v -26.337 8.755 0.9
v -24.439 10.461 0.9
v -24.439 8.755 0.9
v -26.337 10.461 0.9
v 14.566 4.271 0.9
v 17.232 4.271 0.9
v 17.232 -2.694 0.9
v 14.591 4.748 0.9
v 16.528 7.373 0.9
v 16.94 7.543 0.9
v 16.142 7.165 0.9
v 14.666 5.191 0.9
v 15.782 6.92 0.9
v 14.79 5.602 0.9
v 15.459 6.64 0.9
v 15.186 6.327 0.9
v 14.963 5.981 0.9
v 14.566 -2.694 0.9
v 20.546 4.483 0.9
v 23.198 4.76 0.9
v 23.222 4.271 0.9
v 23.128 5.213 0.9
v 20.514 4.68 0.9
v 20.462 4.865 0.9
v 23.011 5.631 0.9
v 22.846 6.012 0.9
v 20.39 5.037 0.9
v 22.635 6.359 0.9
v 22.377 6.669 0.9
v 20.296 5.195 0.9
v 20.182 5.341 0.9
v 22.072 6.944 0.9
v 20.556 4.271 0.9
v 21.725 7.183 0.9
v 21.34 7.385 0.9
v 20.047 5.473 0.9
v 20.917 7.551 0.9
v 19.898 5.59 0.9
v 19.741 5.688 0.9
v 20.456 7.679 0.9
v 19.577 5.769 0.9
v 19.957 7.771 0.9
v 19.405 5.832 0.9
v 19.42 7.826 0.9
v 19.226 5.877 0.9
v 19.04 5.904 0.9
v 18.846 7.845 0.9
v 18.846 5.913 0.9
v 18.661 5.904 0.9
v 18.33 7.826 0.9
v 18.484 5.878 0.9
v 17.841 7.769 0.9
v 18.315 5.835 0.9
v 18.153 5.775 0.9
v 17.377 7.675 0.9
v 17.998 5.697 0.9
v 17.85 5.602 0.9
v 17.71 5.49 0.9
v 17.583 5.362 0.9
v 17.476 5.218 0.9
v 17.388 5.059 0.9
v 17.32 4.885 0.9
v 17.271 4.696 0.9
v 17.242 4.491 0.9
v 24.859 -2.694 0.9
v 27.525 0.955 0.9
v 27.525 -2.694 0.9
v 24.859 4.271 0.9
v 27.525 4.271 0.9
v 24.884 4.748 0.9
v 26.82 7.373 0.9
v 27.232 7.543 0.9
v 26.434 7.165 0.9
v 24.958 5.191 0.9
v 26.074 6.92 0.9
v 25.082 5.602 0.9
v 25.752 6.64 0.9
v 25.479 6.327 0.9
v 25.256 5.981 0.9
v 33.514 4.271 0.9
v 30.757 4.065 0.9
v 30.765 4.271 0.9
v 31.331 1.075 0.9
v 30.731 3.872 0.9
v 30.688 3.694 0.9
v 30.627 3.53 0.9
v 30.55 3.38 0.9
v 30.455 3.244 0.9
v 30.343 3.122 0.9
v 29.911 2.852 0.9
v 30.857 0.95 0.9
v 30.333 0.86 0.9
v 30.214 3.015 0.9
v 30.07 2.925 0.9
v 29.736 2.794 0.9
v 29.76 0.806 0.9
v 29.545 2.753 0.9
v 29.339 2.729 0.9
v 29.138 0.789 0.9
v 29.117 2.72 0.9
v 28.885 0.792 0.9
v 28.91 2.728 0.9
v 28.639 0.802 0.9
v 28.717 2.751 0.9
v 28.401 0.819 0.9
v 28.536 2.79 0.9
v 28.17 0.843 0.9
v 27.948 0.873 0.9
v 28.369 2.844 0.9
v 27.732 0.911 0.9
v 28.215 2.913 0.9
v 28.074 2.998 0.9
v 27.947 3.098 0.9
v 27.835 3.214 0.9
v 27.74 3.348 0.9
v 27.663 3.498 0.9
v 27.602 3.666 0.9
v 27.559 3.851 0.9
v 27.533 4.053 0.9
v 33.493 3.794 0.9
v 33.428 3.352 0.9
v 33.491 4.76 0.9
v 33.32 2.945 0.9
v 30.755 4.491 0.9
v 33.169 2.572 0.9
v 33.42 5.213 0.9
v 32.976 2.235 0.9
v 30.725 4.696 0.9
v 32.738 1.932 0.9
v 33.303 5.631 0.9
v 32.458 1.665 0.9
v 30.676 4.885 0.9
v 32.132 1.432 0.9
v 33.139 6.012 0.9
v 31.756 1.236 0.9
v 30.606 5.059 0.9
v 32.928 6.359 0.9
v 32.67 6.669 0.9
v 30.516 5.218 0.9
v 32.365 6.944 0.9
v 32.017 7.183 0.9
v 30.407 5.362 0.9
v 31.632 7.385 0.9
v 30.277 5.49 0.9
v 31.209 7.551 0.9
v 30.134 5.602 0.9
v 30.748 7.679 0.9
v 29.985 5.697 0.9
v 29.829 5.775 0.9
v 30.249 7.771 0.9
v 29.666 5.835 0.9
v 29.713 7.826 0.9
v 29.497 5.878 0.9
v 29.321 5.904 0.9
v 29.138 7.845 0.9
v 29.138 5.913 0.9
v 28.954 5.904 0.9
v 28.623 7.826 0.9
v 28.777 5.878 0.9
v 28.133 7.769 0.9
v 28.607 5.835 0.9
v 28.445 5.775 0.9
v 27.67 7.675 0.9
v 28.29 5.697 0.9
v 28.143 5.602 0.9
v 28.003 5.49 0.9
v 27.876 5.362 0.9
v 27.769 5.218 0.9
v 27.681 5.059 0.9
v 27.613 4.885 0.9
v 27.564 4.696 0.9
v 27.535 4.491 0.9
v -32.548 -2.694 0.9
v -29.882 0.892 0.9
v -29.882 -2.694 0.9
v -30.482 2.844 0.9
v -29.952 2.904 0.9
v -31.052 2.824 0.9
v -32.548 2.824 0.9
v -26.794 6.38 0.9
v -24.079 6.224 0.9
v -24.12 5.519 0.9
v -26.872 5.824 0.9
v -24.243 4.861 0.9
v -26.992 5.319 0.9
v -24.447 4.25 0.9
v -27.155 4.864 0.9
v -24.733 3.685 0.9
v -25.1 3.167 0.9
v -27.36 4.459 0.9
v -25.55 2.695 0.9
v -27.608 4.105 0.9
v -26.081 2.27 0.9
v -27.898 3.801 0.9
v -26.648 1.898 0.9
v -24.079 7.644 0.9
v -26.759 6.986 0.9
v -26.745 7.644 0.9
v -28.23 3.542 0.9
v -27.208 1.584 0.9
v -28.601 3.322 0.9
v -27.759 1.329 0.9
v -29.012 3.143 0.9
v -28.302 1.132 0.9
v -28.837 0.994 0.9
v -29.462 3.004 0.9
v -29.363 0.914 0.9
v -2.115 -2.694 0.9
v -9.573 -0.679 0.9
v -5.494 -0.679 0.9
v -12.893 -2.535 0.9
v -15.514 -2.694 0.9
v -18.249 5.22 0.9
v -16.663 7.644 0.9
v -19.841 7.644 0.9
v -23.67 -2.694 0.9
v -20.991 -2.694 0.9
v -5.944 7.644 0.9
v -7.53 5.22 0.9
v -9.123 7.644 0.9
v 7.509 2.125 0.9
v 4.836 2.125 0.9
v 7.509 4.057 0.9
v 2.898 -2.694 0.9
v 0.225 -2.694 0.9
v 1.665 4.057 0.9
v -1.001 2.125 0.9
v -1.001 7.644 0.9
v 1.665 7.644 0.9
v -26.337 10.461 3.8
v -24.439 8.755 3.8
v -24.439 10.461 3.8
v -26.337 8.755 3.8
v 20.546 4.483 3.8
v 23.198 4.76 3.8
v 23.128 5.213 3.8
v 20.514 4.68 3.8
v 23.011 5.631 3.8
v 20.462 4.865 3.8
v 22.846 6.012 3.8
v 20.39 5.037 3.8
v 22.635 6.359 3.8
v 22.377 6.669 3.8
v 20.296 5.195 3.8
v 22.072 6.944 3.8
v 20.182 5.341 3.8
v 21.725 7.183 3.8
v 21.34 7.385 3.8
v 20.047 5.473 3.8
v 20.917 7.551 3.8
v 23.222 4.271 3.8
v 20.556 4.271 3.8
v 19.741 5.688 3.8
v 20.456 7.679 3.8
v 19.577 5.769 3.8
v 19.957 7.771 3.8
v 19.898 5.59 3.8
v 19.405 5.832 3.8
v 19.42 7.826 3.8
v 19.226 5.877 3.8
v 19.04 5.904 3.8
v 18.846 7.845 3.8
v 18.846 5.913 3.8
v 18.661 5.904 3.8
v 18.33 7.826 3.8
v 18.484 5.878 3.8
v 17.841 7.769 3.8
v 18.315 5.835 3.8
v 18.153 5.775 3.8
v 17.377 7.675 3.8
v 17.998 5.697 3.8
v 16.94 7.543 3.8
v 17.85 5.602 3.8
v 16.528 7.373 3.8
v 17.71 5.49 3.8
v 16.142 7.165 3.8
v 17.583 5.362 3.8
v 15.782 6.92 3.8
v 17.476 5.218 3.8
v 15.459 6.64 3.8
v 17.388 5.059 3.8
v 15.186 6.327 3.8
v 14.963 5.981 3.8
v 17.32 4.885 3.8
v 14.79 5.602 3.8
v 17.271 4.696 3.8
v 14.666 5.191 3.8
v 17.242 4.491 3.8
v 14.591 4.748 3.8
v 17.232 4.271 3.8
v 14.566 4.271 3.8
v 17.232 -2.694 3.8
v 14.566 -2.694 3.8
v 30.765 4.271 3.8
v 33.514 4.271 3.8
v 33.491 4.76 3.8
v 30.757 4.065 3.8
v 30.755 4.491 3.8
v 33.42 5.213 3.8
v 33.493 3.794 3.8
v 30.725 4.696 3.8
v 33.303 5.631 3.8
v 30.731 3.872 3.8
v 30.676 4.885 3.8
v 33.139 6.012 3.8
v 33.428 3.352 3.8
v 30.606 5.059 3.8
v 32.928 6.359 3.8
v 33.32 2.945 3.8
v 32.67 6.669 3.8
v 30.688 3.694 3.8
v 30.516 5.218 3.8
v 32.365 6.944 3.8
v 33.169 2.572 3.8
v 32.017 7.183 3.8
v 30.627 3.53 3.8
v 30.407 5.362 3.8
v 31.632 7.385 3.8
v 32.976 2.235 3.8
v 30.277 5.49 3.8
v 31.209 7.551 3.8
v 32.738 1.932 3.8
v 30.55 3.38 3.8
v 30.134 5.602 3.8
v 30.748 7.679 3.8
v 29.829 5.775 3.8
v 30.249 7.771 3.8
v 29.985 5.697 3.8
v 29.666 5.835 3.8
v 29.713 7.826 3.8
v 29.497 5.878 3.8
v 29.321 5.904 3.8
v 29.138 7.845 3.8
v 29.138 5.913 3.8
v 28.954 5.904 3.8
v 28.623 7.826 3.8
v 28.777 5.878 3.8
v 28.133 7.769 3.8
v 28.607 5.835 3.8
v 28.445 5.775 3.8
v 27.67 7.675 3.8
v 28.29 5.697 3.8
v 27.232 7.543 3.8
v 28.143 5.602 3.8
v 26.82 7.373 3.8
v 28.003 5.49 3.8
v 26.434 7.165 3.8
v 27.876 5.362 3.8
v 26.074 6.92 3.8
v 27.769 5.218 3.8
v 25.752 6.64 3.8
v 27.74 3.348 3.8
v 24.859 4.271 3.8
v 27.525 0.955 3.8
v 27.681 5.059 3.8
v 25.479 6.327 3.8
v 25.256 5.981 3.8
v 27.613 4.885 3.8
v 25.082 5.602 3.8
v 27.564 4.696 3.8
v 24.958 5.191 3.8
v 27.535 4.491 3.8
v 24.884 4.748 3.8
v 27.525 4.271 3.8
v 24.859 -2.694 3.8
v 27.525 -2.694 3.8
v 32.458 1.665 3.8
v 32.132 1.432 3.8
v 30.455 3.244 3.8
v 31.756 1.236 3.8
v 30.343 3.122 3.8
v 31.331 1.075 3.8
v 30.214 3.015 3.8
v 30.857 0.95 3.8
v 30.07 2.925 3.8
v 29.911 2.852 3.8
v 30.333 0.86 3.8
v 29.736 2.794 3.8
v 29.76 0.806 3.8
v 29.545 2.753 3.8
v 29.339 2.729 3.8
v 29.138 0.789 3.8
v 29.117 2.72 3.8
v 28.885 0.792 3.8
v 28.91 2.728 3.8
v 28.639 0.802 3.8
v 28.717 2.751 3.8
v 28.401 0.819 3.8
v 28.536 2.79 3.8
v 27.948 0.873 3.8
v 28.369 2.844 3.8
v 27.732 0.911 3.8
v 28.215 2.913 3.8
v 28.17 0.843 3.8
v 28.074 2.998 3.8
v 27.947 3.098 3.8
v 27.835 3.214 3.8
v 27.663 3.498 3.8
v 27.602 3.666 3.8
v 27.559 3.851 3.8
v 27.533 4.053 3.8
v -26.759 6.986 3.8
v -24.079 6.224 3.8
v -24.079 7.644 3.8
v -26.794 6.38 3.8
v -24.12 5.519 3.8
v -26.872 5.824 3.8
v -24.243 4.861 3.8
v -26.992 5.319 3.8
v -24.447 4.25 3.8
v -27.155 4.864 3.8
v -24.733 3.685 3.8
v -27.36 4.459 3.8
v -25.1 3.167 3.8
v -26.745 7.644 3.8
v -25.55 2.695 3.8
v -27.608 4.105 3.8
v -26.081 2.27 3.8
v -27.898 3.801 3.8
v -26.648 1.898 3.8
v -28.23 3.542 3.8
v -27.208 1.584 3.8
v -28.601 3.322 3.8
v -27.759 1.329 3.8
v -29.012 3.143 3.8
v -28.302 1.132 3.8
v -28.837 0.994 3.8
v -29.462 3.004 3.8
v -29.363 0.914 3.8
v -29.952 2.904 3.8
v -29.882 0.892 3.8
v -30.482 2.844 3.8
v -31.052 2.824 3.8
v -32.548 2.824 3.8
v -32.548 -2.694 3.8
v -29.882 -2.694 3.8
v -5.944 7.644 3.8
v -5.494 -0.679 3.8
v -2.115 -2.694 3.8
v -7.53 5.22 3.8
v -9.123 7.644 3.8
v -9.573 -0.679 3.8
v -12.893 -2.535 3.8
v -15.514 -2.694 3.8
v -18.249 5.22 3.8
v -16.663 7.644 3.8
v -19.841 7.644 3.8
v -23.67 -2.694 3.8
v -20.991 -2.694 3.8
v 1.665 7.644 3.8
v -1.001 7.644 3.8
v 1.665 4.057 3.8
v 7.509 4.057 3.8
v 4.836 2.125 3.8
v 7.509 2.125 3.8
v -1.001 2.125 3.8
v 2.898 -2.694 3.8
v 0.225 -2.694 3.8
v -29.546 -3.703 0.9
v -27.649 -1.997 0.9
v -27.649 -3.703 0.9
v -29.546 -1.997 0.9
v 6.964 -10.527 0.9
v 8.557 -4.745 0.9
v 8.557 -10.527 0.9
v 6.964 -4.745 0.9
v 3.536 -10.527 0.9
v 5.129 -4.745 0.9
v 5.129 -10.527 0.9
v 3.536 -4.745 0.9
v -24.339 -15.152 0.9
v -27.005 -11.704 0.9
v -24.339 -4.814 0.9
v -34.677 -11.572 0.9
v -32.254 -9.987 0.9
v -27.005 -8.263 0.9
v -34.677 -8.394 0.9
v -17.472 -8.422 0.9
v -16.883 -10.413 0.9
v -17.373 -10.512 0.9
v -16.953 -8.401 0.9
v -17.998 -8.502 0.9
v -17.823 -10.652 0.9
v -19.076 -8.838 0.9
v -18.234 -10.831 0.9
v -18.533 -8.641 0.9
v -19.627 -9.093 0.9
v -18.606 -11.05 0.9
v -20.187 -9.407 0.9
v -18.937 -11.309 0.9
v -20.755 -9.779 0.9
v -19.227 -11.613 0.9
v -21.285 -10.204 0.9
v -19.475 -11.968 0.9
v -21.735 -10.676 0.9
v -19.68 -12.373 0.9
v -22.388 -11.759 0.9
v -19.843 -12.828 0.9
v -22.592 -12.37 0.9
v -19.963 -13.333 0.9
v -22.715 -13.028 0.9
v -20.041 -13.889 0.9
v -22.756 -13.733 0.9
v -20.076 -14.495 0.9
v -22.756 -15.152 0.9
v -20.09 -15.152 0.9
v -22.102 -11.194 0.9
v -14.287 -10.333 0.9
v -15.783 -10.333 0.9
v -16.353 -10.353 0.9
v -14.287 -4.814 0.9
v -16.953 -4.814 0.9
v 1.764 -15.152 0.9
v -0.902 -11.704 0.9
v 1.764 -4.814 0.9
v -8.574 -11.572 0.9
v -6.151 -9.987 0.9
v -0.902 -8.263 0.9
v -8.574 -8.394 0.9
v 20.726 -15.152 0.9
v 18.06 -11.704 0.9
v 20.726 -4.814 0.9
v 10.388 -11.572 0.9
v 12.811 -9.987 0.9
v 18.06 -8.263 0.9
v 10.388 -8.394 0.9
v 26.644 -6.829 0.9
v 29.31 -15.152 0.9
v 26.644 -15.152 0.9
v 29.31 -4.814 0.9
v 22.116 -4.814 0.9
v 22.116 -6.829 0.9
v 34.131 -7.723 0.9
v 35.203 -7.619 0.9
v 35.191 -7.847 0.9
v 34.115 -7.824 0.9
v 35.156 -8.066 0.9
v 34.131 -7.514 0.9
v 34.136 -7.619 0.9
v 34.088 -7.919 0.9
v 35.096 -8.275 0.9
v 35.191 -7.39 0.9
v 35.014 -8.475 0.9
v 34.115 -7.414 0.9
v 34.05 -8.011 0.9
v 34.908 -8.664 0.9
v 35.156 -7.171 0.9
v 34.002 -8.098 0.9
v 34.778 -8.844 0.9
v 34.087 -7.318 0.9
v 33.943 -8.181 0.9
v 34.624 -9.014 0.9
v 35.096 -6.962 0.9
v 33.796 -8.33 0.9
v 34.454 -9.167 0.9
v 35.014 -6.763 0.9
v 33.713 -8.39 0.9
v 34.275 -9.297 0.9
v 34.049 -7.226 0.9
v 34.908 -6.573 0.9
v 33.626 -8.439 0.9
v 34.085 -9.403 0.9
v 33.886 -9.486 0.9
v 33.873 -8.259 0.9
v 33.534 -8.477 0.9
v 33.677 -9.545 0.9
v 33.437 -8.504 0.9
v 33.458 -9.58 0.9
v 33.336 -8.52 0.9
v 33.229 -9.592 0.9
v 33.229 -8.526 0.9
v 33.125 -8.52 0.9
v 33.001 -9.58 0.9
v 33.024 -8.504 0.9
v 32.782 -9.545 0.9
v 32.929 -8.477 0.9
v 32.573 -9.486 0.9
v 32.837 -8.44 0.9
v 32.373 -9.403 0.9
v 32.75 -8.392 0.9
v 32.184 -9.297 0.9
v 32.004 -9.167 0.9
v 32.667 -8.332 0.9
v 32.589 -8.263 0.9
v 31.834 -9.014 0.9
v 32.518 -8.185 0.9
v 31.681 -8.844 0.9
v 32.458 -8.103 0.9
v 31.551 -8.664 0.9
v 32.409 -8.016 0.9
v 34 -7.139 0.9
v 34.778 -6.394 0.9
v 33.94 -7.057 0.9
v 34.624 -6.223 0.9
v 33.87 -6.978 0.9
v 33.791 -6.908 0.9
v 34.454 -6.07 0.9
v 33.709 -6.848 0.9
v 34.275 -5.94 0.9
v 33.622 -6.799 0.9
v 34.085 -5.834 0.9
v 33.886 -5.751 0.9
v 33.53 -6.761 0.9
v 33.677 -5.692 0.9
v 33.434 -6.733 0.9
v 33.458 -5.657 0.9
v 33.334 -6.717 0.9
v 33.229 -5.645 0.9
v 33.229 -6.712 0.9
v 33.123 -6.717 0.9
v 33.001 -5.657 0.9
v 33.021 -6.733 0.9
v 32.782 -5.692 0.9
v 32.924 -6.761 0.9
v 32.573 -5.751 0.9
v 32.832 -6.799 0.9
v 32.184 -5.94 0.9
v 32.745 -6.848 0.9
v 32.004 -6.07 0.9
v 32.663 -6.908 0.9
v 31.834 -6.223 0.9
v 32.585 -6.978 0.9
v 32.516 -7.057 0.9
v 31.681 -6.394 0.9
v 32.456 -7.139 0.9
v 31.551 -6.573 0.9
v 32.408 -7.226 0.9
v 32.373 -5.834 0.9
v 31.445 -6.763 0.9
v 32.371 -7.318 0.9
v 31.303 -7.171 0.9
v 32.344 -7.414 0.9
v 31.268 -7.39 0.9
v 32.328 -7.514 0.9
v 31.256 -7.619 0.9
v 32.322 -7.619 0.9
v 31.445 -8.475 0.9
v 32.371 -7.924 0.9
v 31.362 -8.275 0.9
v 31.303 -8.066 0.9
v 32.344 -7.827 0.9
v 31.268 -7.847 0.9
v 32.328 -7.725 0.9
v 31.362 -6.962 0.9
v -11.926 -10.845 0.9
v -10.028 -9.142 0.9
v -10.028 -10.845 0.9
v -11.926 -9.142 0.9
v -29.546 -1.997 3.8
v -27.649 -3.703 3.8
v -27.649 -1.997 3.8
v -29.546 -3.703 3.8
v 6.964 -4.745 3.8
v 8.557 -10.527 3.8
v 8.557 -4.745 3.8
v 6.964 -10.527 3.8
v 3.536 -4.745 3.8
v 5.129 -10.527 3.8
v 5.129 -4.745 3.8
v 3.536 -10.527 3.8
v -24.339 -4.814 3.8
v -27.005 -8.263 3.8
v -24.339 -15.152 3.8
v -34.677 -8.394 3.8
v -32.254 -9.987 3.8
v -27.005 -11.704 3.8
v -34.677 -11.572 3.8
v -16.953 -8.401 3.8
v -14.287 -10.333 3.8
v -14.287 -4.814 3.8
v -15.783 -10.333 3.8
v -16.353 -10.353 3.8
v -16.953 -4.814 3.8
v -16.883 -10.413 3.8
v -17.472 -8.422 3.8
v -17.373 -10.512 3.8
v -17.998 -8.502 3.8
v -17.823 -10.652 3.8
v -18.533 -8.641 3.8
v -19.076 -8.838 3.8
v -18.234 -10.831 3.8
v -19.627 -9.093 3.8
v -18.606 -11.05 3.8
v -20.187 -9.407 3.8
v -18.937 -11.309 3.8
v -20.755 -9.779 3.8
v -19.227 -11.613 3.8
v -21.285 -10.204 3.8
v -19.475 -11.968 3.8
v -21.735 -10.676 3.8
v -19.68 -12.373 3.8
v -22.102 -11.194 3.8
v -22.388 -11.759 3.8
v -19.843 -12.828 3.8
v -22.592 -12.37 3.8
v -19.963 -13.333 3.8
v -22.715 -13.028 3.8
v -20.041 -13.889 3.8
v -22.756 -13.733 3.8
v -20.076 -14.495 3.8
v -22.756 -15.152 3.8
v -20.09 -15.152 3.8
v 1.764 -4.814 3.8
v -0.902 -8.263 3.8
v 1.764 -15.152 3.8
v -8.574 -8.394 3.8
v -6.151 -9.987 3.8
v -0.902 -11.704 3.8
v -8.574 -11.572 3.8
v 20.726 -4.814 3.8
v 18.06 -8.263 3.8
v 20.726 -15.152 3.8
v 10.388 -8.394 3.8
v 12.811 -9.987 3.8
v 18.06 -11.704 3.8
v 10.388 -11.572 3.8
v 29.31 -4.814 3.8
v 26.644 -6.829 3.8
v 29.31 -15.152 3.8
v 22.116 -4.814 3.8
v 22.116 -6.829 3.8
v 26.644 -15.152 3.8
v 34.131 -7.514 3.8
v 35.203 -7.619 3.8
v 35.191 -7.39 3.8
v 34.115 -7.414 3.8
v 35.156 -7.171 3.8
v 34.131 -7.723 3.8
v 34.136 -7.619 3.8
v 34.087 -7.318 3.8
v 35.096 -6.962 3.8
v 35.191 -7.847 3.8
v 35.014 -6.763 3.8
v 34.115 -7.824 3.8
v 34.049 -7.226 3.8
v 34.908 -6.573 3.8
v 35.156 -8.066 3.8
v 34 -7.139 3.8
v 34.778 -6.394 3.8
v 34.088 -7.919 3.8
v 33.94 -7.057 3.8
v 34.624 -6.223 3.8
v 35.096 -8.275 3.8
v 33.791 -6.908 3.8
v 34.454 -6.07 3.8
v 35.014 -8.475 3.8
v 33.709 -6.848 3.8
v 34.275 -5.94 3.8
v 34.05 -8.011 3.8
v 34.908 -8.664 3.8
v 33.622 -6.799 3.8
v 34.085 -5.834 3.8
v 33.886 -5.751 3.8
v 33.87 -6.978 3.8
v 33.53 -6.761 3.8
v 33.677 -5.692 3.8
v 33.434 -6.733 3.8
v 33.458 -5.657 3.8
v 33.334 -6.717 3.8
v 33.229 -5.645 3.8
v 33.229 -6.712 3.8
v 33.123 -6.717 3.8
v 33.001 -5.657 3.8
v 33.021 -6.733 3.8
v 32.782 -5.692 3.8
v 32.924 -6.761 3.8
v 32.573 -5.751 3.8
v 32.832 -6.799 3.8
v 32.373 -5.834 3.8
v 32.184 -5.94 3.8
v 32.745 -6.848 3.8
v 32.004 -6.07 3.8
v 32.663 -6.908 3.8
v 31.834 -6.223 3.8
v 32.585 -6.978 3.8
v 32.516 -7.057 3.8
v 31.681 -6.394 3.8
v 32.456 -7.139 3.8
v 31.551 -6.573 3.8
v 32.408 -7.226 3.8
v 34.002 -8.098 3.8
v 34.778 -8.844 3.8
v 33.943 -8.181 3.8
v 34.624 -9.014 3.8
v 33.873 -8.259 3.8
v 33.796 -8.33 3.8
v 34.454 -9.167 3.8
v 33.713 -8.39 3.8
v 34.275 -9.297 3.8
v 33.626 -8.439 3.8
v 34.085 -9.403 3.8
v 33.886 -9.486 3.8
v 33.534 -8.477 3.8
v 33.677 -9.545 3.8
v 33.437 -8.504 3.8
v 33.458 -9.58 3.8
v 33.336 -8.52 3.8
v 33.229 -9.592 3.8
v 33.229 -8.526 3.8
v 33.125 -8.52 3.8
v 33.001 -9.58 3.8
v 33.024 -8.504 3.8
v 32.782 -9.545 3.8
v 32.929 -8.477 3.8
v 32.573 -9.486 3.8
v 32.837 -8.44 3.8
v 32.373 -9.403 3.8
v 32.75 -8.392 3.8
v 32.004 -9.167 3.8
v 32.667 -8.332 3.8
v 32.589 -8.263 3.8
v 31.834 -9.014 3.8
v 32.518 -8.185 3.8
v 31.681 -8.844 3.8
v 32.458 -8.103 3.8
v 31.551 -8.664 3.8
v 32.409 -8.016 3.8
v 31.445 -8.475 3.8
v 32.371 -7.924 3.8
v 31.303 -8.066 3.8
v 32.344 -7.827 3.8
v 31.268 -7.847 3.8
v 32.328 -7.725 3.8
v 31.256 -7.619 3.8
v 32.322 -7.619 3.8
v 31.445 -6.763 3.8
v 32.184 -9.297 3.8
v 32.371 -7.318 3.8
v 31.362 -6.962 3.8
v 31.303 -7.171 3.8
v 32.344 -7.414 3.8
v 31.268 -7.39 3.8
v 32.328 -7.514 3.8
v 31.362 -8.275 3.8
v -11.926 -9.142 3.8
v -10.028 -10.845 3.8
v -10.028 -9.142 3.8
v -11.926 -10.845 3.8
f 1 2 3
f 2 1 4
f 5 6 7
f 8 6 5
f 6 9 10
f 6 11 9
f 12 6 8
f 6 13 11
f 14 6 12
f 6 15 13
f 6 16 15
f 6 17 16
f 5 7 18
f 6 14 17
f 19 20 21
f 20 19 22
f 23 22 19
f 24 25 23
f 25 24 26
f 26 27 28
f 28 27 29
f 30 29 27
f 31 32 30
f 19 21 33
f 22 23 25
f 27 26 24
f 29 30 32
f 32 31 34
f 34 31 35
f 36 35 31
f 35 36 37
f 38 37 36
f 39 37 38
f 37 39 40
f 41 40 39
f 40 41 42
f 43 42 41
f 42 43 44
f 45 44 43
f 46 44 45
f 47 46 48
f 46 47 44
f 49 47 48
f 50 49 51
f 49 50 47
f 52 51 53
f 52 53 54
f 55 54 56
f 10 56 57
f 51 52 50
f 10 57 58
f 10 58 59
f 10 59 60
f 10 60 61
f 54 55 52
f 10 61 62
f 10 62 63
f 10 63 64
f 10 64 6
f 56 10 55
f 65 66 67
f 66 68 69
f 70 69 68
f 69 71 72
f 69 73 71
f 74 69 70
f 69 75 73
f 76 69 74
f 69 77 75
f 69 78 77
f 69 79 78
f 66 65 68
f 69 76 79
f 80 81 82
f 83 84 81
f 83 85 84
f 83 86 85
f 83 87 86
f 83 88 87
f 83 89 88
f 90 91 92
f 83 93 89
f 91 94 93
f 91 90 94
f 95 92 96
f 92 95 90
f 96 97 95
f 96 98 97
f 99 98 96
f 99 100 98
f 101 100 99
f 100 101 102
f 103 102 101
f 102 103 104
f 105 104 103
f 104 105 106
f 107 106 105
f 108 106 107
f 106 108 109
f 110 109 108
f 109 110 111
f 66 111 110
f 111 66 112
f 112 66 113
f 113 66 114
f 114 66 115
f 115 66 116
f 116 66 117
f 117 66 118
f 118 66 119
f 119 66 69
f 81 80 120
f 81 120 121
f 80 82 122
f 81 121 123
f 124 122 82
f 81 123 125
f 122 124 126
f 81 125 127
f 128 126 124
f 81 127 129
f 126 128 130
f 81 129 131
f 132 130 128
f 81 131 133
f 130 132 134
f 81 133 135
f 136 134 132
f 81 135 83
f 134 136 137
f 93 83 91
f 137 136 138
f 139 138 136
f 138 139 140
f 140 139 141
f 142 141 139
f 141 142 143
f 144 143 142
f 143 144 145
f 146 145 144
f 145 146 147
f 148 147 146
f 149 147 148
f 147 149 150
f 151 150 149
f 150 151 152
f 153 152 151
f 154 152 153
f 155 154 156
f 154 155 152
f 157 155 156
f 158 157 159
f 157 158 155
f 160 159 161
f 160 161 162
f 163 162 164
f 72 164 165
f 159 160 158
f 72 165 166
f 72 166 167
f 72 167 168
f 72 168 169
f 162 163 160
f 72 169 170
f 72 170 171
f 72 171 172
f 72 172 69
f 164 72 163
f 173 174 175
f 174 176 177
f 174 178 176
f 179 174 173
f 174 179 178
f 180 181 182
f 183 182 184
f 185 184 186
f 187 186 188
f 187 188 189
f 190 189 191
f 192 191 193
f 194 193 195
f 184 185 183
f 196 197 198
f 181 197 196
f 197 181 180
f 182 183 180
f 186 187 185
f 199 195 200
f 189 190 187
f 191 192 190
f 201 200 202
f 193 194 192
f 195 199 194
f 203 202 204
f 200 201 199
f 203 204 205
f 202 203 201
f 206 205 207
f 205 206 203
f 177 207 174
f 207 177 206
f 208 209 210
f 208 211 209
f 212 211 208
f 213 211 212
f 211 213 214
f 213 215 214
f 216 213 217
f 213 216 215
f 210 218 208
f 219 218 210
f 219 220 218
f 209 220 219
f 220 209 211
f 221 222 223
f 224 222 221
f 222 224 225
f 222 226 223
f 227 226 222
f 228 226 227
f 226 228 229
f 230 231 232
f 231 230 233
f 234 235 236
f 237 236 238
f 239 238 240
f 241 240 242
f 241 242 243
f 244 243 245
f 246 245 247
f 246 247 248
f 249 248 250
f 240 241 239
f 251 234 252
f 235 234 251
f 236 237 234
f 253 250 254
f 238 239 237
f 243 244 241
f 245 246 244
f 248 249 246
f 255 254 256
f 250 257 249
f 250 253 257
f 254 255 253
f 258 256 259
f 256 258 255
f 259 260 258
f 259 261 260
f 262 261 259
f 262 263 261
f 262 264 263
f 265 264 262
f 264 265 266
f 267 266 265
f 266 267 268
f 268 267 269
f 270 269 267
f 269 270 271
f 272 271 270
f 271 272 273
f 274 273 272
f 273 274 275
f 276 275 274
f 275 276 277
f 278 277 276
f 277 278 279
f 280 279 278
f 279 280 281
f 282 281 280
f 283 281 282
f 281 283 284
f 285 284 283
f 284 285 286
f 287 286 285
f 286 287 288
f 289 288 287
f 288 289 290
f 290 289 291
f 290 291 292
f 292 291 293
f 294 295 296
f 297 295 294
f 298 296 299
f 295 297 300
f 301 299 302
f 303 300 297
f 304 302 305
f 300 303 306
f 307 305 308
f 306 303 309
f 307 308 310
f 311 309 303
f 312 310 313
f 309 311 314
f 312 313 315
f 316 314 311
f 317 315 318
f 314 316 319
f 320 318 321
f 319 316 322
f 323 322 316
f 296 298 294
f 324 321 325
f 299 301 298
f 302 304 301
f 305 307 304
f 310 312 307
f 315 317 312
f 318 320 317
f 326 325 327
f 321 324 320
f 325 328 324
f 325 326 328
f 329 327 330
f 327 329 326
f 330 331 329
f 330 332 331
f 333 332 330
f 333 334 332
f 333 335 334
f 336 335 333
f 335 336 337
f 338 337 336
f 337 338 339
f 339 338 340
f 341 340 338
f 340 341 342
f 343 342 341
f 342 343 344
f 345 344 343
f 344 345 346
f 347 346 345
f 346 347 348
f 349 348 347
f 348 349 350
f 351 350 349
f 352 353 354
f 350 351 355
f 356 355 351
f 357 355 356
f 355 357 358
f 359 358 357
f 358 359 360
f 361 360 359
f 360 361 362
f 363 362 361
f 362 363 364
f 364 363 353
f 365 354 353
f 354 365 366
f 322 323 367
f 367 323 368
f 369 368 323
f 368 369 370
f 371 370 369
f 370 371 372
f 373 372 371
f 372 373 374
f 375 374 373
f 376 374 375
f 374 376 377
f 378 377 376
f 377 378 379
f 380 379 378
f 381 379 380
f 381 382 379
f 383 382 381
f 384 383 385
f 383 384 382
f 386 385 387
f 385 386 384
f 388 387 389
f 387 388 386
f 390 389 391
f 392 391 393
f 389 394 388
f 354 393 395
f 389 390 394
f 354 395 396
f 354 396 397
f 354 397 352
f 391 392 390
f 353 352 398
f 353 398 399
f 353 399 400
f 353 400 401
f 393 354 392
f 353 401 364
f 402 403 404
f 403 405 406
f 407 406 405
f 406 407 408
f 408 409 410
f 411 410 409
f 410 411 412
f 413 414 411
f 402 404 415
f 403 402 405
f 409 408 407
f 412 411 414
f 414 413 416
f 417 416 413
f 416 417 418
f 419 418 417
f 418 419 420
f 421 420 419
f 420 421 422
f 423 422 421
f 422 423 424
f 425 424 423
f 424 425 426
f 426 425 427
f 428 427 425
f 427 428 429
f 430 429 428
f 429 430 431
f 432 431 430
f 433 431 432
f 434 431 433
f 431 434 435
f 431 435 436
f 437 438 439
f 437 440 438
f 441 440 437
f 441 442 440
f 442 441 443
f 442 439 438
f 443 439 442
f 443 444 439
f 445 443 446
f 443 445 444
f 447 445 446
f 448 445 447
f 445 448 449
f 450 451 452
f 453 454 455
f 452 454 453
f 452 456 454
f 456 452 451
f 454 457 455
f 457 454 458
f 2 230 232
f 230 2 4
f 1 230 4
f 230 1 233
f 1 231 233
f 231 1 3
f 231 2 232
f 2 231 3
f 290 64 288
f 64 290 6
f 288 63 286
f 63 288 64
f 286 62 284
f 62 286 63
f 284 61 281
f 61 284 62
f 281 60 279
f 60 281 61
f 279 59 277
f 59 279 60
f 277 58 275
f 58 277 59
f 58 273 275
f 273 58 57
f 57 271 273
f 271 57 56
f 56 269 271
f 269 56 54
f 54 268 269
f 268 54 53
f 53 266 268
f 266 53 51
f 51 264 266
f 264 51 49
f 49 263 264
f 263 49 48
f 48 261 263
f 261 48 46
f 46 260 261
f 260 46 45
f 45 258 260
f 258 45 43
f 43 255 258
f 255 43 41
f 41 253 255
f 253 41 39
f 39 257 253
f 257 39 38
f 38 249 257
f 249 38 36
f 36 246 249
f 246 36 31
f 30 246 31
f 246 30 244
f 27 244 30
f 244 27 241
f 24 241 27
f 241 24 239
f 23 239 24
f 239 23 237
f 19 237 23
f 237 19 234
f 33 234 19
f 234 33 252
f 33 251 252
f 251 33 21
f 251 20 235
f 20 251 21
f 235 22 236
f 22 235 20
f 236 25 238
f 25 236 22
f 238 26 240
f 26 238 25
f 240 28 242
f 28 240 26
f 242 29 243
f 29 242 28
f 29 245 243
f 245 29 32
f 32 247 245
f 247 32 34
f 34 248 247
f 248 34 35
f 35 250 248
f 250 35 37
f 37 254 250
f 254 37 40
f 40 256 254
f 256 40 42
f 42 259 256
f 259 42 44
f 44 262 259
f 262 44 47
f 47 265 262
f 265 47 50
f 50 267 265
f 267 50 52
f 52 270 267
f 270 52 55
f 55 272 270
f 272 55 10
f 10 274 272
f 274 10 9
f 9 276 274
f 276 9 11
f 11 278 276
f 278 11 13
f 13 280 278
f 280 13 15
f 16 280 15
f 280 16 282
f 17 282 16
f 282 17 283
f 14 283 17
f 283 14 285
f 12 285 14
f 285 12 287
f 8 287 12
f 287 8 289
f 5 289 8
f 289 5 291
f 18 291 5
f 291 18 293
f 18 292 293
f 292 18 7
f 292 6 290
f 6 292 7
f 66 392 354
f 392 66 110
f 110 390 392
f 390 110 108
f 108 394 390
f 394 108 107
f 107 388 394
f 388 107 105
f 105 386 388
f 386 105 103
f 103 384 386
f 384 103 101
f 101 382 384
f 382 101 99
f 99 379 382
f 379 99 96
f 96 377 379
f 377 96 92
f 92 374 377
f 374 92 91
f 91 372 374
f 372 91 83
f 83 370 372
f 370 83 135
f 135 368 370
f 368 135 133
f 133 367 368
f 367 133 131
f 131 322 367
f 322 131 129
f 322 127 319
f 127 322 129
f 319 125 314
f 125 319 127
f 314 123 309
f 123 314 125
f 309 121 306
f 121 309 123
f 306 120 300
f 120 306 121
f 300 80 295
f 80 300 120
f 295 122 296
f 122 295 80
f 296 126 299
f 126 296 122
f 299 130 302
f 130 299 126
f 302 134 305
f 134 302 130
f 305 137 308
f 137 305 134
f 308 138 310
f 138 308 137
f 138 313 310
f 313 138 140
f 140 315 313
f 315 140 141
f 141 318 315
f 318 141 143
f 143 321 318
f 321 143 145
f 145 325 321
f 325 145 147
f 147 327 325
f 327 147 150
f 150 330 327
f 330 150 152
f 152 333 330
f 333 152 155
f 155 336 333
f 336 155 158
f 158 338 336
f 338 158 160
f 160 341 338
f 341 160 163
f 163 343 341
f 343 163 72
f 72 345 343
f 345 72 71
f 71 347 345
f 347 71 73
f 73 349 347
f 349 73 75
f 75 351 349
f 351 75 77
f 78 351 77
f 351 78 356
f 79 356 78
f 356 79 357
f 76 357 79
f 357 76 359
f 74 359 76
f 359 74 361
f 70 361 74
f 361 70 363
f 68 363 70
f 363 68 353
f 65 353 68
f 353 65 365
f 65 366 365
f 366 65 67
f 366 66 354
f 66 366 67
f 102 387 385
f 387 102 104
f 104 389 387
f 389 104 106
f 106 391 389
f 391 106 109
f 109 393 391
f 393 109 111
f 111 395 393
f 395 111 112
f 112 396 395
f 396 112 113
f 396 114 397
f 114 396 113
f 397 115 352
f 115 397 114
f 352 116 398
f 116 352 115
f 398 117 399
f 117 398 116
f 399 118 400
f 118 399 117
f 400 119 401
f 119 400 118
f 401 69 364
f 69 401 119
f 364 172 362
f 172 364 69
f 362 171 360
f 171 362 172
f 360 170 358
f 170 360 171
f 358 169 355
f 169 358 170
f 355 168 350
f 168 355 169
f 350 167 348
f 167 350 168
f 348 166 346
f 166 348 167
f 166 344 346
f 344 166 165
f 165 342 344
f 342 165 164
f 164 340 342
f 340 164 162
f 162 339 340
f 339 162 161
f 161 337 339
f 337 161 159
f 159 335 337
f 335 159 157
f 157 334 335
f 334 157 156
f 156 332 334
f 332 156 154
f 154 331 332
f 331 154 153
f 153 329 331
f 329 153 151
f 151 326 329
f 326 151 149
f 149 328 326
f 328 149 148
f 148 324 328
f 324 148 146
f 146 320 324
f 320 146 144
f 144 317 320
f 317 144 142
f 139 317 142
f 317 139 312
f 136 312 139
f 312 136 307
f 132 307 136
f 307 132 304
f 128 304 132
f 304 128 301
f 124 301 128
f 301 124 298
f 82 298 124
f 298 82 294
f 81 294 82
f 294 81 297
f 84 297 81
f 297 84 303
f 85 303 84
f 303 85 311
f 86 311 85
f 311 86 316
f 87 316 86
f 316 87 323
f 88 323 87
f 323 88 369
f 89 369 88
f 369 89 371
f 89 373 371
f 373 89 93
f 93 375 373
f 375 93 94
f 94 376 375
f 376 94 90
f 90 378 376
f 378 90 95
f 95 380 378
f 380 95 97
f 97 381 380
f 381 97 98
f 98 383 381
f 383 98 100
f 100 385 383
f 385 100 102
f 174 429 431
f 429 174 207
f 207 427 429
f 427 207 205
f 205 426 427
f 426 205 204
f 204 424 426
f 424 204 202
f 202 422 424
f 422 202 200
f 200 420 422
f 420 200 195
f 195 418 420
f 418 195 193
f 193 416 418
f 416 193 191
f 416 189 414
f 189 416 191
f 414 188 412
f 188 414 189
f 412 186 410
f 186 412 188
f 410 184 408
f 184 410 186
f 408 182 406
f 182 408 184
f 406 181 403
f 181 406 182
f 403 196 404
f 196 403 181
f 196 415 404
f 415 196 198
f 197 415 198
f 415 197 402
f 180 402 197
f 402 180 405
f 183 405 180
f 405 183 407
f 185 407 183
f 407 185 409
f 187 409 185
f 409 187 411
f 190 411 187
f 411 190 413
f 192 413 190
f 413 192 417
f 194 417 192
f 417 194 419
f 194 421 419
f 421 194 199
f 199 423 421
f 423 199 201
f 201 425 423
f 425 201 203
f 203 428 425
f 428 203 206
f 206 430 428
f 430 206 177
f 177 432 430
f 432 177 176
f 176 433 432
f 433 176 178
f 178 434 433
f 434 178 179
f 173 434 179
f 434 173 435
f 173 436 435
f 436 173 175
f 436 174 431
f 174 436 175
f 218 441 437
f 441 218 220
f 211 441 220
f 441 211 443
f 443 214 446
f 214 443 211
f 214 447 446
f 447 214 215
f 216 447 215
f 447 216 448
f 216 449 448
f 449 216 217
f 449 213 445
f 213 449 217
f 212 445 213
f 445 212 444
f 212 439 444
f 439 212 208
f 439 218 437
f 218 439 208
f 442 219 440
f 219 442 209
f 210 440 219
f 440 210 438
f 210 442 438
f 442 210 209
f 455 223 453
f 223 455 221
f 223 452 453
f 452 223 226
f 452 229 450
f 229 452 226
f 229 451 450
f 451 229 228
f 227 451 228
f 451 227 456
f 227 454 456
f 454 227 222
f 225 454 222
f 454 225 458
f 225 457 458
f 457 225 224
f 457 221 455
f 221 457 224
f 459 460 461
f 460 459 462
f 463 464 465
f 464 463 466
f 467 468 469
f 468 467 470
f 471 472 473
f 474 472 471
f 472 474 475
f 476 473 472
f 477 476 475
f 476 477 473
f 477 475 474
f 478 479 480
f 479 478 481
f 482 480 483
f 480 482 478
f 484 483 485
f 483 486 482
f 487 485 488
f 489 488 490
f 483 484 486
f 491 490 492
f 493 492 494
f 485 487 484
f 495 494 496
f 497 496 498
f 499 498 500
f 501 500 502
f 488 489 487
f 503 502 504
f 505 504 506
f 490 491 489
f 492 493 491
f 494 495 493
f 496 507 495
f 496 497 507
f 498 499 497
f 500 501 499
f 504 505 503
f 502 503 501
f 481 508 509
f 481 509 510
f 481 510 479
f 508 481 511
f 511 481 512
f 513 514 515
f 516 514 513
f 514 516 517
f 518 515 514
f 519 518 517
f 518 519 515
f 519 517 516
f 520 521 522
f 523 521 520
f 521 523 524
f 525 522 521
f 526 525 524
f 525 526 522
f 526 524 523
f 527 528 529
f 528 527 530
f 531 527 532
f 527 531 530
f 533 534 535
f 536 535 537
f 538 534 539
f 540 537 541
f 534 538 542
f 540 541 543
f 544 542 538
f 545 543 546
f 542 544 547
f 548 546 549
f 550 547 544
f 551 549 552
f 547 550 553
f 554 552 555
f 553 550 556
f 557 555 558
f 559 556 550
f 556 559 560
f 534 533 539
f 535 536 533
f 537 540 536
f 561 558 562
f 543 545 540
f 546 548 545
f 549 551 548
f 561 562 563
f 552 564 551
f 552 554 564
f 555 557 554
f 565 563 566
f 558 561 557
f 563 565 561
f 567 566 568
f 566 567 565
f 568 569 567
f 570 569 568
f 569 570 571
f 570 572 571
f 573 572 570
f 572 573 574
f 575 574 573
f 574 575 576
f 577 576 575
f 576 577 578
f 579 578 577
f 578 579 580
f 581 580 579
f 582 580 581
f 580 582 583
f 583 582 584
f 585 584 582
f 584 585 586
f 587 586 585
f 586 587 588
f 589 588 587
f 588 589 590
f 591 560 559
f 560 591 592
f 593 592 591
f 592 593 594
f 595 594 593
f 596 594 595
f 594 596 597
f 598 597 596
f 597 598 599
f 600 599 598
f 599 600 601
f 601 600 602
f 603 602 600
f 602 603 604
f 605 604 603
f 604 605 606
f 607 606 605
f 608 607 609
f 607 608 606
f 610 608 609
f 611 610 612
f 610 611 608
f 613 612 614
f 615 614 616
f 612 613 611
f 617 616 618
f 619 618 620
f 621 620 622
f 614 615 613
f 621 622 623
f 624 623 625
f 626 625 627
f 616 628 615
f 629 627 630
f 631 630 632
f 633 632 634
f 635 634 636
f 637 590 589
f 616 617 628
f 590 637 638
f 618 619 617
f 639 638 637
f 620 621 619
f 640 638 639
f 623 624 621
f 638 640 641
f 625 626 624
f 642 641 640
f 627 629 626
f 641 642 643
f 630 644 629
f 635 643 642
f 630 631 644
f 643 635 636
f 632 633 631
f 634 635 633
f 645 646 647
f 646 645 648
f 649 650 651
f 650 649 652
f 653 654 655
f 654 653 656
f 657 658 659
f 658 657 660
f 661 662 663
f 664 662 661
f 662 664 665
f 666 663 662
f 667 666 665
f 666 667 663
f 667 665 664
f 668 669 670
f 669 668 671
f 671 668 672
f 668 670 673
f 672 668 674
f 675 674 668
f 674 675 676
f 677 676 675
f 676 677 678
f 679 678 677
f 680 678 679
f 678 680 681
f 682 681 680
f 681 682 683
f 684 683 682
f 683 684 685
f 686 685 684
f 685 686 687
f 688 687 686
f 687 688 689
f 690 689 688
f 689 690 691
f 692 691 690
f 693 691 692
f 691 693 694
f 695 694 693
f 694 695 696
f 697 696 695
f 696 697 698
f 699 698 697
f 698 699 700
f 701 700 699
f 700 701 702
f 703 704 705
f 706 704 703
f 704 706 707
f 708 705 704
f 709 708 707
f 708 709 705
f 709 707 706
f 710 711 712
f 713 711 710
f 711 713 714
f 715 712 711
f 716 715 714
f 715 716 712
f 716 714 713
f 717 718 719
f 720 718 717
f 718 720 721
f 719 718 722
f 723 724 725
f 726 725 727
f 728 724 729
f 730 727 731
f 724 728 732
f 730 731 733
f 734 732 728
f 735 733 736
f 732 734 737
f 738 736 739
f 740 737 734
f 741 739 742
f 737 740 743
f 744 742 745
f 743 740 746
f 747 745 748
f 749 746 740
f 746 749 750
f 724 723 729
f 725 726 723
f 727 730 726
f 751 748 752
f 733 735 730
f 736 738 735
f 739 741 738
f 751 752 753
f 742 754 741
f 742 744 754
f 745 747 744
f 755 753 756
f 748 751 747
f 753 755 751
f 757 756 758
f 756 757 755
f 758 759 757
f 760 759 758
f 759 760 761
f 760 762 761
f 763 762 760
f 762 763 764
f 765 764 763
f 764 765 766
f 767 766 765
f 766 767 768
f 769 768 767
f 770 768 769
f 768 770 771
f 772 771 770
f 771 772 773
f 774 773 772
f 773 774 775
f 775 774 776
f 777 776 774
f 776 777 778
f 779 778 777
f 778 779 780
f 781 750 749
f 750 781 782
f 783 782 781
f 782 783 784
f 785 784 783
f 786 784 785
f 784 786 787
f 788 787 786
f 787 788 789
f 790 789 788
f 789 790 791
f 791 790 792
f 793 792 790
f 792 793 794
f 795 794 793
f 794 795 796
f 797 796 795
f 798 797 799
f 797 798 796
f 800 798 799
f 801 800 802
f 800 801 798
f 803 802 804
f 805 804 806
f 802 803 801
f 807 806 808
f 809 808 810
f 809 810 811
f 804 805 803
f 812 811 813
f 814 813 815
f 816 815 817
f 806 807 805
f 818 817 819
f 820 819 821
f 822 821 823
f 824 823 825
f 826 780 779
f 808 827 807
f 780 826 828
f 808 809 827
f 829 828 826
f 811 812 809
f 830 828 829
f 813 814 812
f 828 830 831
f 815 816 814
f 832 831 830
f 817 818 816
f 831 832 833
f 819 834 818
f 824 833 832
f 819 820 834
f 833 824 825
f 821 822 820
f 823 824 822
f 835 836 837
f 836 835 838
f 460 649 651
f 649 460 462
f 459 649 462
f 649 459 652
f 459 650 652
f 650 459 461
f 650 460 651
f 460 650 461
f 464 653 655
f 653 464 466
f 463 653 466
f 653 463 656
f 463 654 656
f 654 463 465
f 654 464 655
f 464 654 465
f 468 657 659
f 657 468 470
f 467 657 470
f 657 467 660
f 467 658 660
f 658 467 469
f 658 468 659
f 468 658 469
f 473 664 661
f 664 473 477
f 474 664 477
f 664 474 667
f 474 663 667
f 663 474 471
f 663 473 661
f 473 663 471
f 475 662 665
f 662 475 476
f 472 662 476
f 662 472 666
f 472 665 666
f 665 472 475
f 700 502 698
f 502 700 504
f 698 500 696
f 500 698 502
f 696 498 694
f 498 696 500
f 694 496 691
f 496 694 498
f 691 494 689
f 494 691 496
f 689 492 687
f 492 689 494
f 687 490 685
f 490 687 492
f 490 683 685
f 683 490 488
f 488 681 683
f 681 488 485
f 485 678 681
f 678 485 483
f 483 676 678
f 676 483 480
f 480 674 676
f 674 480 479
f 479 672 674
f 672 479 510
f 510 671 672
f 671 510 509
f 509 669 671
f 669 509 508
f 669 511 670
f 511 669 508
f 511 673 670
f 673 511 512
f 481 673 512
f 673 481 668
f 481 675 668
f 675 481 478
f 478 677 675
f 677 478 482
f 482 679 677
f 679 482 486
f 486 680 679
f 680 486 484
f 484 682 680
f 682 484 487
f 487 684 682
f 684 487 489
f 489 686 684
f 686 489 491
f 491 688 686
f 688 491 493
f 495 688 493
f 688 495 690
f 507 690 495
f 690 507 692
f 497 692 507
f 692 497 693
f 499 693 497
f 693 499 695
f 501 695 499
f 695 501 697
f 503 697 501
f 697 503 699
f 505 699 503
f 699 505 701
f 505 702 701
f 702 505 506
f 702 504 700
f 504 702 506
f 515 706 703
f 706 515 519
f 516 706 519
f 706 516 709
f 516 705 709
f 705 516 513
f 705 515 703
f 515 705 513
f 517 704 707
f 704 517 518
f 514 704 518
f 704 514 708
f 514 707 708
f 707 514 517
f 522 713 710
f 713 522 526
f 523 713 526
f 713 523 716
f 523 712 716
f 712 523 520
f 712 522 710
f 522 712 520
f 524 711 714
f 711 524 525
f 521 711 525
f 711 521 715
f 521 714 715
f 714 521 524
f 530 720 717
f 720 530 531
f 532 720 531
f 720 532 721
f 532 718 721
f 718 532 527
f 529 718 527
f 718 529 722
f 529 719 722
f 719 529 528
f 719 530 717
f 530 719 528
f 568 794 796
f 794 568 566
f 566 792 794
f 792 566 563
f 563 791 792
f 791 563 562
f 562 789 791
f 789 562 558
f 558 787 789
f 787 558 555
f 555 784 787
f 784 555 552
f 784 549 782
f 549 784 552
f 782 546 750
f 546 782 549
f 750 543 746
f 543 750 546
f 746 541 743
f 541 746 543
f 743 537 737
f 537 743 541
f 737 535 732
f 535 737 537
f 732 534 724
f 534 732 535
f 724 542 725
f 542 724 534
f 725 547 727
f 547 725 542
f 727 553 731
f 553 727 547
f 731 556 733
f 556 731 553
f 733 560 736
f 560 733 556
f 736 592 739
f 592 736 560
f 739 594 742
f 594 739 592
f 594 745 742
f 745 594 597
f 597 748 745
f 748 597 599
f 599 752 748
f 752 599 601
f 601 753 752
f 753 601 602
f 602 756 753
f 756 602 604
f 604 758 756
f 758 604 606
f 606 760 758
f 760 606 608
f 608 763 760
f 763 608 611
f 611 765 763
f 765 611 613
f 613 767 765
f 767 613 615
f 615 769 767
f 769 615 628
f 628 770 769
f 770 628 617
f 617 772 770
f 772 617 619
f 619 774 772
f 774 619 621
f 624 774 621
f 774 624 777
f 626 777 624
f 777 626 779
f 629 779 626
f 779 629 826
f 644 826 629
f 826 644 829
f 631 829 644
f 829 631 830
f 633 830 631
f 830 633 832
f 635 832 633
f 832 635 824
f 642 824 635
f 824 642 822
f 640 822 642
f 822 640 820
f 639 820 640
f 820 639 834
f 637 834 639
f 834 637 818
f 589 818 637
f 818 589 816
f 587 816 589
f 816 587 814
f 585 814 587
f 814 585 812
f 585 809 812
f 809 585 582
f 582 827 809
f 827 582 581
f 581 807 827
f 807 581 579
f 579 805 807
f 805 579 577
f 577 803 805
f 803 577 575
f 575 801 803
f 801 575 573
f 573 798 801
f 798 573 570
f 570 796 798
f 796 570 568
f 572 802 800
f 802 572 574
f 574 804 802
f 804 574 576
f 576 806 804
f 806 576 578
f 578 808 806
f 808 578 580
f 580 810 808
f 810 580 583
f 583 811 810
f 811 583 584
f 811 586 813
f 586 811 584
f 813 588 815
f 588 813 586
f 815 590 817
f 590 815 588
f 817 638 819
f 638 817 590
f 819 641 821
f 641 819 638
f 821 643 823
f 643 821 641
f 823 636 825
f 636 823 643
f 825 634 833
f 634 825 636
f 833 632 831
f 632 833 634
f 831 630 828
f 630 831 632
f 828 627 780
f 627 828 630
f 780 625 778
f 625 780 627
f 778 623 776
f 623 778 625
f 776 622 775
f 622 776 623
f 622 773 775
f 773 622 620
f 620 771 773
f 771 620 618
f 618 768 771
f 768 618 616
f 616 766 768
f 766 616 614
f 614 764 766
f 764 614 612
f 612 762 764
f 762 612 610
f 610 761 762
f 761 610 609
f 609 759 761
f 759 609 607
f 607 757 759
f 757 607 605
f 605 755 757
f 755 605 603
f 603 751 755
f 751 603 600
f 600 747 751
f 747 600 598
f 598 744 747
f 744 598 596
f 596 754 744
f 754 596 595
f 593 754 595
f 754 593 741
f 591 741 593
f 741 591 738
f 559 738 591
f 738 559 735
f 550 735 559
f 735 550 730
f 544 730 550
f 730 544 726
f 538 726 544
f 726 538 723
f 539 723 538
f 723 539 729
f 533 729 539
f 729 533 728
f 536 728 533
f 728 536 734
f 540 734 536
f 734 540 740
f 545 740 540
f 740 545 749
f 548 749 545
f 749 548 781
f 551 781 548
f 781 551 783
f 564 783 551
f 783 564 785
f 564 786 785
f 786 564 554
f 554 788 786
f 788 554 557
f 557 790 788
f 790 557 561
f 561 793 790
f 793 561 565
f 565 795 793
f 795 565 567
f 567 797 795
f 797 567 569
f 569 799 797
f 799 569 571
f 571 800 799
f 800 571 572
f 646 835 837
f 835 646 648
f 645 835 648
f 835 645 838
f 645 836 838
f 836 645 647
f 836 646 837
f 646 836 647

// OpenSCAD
$fn = 48;
  // syllabics (overlaid on icon, tallest)
  translate([0, 3.729, 0.900]) linear_extrude(height=2.900) text("ᓰᐱᐃᔭ ᒋᑭ", size=10.211, halign="center", valign="center", font="Euphemia UCAS:style=Bold");
  translate([0, -8.729, 0.900]) linear_extrude(height=2.900) text("ᐋᓱᐗᐦᐊᒣᐤ", size=10.211, halign="center", valign="center", font="Euphemia UCAS:style=Bold");
